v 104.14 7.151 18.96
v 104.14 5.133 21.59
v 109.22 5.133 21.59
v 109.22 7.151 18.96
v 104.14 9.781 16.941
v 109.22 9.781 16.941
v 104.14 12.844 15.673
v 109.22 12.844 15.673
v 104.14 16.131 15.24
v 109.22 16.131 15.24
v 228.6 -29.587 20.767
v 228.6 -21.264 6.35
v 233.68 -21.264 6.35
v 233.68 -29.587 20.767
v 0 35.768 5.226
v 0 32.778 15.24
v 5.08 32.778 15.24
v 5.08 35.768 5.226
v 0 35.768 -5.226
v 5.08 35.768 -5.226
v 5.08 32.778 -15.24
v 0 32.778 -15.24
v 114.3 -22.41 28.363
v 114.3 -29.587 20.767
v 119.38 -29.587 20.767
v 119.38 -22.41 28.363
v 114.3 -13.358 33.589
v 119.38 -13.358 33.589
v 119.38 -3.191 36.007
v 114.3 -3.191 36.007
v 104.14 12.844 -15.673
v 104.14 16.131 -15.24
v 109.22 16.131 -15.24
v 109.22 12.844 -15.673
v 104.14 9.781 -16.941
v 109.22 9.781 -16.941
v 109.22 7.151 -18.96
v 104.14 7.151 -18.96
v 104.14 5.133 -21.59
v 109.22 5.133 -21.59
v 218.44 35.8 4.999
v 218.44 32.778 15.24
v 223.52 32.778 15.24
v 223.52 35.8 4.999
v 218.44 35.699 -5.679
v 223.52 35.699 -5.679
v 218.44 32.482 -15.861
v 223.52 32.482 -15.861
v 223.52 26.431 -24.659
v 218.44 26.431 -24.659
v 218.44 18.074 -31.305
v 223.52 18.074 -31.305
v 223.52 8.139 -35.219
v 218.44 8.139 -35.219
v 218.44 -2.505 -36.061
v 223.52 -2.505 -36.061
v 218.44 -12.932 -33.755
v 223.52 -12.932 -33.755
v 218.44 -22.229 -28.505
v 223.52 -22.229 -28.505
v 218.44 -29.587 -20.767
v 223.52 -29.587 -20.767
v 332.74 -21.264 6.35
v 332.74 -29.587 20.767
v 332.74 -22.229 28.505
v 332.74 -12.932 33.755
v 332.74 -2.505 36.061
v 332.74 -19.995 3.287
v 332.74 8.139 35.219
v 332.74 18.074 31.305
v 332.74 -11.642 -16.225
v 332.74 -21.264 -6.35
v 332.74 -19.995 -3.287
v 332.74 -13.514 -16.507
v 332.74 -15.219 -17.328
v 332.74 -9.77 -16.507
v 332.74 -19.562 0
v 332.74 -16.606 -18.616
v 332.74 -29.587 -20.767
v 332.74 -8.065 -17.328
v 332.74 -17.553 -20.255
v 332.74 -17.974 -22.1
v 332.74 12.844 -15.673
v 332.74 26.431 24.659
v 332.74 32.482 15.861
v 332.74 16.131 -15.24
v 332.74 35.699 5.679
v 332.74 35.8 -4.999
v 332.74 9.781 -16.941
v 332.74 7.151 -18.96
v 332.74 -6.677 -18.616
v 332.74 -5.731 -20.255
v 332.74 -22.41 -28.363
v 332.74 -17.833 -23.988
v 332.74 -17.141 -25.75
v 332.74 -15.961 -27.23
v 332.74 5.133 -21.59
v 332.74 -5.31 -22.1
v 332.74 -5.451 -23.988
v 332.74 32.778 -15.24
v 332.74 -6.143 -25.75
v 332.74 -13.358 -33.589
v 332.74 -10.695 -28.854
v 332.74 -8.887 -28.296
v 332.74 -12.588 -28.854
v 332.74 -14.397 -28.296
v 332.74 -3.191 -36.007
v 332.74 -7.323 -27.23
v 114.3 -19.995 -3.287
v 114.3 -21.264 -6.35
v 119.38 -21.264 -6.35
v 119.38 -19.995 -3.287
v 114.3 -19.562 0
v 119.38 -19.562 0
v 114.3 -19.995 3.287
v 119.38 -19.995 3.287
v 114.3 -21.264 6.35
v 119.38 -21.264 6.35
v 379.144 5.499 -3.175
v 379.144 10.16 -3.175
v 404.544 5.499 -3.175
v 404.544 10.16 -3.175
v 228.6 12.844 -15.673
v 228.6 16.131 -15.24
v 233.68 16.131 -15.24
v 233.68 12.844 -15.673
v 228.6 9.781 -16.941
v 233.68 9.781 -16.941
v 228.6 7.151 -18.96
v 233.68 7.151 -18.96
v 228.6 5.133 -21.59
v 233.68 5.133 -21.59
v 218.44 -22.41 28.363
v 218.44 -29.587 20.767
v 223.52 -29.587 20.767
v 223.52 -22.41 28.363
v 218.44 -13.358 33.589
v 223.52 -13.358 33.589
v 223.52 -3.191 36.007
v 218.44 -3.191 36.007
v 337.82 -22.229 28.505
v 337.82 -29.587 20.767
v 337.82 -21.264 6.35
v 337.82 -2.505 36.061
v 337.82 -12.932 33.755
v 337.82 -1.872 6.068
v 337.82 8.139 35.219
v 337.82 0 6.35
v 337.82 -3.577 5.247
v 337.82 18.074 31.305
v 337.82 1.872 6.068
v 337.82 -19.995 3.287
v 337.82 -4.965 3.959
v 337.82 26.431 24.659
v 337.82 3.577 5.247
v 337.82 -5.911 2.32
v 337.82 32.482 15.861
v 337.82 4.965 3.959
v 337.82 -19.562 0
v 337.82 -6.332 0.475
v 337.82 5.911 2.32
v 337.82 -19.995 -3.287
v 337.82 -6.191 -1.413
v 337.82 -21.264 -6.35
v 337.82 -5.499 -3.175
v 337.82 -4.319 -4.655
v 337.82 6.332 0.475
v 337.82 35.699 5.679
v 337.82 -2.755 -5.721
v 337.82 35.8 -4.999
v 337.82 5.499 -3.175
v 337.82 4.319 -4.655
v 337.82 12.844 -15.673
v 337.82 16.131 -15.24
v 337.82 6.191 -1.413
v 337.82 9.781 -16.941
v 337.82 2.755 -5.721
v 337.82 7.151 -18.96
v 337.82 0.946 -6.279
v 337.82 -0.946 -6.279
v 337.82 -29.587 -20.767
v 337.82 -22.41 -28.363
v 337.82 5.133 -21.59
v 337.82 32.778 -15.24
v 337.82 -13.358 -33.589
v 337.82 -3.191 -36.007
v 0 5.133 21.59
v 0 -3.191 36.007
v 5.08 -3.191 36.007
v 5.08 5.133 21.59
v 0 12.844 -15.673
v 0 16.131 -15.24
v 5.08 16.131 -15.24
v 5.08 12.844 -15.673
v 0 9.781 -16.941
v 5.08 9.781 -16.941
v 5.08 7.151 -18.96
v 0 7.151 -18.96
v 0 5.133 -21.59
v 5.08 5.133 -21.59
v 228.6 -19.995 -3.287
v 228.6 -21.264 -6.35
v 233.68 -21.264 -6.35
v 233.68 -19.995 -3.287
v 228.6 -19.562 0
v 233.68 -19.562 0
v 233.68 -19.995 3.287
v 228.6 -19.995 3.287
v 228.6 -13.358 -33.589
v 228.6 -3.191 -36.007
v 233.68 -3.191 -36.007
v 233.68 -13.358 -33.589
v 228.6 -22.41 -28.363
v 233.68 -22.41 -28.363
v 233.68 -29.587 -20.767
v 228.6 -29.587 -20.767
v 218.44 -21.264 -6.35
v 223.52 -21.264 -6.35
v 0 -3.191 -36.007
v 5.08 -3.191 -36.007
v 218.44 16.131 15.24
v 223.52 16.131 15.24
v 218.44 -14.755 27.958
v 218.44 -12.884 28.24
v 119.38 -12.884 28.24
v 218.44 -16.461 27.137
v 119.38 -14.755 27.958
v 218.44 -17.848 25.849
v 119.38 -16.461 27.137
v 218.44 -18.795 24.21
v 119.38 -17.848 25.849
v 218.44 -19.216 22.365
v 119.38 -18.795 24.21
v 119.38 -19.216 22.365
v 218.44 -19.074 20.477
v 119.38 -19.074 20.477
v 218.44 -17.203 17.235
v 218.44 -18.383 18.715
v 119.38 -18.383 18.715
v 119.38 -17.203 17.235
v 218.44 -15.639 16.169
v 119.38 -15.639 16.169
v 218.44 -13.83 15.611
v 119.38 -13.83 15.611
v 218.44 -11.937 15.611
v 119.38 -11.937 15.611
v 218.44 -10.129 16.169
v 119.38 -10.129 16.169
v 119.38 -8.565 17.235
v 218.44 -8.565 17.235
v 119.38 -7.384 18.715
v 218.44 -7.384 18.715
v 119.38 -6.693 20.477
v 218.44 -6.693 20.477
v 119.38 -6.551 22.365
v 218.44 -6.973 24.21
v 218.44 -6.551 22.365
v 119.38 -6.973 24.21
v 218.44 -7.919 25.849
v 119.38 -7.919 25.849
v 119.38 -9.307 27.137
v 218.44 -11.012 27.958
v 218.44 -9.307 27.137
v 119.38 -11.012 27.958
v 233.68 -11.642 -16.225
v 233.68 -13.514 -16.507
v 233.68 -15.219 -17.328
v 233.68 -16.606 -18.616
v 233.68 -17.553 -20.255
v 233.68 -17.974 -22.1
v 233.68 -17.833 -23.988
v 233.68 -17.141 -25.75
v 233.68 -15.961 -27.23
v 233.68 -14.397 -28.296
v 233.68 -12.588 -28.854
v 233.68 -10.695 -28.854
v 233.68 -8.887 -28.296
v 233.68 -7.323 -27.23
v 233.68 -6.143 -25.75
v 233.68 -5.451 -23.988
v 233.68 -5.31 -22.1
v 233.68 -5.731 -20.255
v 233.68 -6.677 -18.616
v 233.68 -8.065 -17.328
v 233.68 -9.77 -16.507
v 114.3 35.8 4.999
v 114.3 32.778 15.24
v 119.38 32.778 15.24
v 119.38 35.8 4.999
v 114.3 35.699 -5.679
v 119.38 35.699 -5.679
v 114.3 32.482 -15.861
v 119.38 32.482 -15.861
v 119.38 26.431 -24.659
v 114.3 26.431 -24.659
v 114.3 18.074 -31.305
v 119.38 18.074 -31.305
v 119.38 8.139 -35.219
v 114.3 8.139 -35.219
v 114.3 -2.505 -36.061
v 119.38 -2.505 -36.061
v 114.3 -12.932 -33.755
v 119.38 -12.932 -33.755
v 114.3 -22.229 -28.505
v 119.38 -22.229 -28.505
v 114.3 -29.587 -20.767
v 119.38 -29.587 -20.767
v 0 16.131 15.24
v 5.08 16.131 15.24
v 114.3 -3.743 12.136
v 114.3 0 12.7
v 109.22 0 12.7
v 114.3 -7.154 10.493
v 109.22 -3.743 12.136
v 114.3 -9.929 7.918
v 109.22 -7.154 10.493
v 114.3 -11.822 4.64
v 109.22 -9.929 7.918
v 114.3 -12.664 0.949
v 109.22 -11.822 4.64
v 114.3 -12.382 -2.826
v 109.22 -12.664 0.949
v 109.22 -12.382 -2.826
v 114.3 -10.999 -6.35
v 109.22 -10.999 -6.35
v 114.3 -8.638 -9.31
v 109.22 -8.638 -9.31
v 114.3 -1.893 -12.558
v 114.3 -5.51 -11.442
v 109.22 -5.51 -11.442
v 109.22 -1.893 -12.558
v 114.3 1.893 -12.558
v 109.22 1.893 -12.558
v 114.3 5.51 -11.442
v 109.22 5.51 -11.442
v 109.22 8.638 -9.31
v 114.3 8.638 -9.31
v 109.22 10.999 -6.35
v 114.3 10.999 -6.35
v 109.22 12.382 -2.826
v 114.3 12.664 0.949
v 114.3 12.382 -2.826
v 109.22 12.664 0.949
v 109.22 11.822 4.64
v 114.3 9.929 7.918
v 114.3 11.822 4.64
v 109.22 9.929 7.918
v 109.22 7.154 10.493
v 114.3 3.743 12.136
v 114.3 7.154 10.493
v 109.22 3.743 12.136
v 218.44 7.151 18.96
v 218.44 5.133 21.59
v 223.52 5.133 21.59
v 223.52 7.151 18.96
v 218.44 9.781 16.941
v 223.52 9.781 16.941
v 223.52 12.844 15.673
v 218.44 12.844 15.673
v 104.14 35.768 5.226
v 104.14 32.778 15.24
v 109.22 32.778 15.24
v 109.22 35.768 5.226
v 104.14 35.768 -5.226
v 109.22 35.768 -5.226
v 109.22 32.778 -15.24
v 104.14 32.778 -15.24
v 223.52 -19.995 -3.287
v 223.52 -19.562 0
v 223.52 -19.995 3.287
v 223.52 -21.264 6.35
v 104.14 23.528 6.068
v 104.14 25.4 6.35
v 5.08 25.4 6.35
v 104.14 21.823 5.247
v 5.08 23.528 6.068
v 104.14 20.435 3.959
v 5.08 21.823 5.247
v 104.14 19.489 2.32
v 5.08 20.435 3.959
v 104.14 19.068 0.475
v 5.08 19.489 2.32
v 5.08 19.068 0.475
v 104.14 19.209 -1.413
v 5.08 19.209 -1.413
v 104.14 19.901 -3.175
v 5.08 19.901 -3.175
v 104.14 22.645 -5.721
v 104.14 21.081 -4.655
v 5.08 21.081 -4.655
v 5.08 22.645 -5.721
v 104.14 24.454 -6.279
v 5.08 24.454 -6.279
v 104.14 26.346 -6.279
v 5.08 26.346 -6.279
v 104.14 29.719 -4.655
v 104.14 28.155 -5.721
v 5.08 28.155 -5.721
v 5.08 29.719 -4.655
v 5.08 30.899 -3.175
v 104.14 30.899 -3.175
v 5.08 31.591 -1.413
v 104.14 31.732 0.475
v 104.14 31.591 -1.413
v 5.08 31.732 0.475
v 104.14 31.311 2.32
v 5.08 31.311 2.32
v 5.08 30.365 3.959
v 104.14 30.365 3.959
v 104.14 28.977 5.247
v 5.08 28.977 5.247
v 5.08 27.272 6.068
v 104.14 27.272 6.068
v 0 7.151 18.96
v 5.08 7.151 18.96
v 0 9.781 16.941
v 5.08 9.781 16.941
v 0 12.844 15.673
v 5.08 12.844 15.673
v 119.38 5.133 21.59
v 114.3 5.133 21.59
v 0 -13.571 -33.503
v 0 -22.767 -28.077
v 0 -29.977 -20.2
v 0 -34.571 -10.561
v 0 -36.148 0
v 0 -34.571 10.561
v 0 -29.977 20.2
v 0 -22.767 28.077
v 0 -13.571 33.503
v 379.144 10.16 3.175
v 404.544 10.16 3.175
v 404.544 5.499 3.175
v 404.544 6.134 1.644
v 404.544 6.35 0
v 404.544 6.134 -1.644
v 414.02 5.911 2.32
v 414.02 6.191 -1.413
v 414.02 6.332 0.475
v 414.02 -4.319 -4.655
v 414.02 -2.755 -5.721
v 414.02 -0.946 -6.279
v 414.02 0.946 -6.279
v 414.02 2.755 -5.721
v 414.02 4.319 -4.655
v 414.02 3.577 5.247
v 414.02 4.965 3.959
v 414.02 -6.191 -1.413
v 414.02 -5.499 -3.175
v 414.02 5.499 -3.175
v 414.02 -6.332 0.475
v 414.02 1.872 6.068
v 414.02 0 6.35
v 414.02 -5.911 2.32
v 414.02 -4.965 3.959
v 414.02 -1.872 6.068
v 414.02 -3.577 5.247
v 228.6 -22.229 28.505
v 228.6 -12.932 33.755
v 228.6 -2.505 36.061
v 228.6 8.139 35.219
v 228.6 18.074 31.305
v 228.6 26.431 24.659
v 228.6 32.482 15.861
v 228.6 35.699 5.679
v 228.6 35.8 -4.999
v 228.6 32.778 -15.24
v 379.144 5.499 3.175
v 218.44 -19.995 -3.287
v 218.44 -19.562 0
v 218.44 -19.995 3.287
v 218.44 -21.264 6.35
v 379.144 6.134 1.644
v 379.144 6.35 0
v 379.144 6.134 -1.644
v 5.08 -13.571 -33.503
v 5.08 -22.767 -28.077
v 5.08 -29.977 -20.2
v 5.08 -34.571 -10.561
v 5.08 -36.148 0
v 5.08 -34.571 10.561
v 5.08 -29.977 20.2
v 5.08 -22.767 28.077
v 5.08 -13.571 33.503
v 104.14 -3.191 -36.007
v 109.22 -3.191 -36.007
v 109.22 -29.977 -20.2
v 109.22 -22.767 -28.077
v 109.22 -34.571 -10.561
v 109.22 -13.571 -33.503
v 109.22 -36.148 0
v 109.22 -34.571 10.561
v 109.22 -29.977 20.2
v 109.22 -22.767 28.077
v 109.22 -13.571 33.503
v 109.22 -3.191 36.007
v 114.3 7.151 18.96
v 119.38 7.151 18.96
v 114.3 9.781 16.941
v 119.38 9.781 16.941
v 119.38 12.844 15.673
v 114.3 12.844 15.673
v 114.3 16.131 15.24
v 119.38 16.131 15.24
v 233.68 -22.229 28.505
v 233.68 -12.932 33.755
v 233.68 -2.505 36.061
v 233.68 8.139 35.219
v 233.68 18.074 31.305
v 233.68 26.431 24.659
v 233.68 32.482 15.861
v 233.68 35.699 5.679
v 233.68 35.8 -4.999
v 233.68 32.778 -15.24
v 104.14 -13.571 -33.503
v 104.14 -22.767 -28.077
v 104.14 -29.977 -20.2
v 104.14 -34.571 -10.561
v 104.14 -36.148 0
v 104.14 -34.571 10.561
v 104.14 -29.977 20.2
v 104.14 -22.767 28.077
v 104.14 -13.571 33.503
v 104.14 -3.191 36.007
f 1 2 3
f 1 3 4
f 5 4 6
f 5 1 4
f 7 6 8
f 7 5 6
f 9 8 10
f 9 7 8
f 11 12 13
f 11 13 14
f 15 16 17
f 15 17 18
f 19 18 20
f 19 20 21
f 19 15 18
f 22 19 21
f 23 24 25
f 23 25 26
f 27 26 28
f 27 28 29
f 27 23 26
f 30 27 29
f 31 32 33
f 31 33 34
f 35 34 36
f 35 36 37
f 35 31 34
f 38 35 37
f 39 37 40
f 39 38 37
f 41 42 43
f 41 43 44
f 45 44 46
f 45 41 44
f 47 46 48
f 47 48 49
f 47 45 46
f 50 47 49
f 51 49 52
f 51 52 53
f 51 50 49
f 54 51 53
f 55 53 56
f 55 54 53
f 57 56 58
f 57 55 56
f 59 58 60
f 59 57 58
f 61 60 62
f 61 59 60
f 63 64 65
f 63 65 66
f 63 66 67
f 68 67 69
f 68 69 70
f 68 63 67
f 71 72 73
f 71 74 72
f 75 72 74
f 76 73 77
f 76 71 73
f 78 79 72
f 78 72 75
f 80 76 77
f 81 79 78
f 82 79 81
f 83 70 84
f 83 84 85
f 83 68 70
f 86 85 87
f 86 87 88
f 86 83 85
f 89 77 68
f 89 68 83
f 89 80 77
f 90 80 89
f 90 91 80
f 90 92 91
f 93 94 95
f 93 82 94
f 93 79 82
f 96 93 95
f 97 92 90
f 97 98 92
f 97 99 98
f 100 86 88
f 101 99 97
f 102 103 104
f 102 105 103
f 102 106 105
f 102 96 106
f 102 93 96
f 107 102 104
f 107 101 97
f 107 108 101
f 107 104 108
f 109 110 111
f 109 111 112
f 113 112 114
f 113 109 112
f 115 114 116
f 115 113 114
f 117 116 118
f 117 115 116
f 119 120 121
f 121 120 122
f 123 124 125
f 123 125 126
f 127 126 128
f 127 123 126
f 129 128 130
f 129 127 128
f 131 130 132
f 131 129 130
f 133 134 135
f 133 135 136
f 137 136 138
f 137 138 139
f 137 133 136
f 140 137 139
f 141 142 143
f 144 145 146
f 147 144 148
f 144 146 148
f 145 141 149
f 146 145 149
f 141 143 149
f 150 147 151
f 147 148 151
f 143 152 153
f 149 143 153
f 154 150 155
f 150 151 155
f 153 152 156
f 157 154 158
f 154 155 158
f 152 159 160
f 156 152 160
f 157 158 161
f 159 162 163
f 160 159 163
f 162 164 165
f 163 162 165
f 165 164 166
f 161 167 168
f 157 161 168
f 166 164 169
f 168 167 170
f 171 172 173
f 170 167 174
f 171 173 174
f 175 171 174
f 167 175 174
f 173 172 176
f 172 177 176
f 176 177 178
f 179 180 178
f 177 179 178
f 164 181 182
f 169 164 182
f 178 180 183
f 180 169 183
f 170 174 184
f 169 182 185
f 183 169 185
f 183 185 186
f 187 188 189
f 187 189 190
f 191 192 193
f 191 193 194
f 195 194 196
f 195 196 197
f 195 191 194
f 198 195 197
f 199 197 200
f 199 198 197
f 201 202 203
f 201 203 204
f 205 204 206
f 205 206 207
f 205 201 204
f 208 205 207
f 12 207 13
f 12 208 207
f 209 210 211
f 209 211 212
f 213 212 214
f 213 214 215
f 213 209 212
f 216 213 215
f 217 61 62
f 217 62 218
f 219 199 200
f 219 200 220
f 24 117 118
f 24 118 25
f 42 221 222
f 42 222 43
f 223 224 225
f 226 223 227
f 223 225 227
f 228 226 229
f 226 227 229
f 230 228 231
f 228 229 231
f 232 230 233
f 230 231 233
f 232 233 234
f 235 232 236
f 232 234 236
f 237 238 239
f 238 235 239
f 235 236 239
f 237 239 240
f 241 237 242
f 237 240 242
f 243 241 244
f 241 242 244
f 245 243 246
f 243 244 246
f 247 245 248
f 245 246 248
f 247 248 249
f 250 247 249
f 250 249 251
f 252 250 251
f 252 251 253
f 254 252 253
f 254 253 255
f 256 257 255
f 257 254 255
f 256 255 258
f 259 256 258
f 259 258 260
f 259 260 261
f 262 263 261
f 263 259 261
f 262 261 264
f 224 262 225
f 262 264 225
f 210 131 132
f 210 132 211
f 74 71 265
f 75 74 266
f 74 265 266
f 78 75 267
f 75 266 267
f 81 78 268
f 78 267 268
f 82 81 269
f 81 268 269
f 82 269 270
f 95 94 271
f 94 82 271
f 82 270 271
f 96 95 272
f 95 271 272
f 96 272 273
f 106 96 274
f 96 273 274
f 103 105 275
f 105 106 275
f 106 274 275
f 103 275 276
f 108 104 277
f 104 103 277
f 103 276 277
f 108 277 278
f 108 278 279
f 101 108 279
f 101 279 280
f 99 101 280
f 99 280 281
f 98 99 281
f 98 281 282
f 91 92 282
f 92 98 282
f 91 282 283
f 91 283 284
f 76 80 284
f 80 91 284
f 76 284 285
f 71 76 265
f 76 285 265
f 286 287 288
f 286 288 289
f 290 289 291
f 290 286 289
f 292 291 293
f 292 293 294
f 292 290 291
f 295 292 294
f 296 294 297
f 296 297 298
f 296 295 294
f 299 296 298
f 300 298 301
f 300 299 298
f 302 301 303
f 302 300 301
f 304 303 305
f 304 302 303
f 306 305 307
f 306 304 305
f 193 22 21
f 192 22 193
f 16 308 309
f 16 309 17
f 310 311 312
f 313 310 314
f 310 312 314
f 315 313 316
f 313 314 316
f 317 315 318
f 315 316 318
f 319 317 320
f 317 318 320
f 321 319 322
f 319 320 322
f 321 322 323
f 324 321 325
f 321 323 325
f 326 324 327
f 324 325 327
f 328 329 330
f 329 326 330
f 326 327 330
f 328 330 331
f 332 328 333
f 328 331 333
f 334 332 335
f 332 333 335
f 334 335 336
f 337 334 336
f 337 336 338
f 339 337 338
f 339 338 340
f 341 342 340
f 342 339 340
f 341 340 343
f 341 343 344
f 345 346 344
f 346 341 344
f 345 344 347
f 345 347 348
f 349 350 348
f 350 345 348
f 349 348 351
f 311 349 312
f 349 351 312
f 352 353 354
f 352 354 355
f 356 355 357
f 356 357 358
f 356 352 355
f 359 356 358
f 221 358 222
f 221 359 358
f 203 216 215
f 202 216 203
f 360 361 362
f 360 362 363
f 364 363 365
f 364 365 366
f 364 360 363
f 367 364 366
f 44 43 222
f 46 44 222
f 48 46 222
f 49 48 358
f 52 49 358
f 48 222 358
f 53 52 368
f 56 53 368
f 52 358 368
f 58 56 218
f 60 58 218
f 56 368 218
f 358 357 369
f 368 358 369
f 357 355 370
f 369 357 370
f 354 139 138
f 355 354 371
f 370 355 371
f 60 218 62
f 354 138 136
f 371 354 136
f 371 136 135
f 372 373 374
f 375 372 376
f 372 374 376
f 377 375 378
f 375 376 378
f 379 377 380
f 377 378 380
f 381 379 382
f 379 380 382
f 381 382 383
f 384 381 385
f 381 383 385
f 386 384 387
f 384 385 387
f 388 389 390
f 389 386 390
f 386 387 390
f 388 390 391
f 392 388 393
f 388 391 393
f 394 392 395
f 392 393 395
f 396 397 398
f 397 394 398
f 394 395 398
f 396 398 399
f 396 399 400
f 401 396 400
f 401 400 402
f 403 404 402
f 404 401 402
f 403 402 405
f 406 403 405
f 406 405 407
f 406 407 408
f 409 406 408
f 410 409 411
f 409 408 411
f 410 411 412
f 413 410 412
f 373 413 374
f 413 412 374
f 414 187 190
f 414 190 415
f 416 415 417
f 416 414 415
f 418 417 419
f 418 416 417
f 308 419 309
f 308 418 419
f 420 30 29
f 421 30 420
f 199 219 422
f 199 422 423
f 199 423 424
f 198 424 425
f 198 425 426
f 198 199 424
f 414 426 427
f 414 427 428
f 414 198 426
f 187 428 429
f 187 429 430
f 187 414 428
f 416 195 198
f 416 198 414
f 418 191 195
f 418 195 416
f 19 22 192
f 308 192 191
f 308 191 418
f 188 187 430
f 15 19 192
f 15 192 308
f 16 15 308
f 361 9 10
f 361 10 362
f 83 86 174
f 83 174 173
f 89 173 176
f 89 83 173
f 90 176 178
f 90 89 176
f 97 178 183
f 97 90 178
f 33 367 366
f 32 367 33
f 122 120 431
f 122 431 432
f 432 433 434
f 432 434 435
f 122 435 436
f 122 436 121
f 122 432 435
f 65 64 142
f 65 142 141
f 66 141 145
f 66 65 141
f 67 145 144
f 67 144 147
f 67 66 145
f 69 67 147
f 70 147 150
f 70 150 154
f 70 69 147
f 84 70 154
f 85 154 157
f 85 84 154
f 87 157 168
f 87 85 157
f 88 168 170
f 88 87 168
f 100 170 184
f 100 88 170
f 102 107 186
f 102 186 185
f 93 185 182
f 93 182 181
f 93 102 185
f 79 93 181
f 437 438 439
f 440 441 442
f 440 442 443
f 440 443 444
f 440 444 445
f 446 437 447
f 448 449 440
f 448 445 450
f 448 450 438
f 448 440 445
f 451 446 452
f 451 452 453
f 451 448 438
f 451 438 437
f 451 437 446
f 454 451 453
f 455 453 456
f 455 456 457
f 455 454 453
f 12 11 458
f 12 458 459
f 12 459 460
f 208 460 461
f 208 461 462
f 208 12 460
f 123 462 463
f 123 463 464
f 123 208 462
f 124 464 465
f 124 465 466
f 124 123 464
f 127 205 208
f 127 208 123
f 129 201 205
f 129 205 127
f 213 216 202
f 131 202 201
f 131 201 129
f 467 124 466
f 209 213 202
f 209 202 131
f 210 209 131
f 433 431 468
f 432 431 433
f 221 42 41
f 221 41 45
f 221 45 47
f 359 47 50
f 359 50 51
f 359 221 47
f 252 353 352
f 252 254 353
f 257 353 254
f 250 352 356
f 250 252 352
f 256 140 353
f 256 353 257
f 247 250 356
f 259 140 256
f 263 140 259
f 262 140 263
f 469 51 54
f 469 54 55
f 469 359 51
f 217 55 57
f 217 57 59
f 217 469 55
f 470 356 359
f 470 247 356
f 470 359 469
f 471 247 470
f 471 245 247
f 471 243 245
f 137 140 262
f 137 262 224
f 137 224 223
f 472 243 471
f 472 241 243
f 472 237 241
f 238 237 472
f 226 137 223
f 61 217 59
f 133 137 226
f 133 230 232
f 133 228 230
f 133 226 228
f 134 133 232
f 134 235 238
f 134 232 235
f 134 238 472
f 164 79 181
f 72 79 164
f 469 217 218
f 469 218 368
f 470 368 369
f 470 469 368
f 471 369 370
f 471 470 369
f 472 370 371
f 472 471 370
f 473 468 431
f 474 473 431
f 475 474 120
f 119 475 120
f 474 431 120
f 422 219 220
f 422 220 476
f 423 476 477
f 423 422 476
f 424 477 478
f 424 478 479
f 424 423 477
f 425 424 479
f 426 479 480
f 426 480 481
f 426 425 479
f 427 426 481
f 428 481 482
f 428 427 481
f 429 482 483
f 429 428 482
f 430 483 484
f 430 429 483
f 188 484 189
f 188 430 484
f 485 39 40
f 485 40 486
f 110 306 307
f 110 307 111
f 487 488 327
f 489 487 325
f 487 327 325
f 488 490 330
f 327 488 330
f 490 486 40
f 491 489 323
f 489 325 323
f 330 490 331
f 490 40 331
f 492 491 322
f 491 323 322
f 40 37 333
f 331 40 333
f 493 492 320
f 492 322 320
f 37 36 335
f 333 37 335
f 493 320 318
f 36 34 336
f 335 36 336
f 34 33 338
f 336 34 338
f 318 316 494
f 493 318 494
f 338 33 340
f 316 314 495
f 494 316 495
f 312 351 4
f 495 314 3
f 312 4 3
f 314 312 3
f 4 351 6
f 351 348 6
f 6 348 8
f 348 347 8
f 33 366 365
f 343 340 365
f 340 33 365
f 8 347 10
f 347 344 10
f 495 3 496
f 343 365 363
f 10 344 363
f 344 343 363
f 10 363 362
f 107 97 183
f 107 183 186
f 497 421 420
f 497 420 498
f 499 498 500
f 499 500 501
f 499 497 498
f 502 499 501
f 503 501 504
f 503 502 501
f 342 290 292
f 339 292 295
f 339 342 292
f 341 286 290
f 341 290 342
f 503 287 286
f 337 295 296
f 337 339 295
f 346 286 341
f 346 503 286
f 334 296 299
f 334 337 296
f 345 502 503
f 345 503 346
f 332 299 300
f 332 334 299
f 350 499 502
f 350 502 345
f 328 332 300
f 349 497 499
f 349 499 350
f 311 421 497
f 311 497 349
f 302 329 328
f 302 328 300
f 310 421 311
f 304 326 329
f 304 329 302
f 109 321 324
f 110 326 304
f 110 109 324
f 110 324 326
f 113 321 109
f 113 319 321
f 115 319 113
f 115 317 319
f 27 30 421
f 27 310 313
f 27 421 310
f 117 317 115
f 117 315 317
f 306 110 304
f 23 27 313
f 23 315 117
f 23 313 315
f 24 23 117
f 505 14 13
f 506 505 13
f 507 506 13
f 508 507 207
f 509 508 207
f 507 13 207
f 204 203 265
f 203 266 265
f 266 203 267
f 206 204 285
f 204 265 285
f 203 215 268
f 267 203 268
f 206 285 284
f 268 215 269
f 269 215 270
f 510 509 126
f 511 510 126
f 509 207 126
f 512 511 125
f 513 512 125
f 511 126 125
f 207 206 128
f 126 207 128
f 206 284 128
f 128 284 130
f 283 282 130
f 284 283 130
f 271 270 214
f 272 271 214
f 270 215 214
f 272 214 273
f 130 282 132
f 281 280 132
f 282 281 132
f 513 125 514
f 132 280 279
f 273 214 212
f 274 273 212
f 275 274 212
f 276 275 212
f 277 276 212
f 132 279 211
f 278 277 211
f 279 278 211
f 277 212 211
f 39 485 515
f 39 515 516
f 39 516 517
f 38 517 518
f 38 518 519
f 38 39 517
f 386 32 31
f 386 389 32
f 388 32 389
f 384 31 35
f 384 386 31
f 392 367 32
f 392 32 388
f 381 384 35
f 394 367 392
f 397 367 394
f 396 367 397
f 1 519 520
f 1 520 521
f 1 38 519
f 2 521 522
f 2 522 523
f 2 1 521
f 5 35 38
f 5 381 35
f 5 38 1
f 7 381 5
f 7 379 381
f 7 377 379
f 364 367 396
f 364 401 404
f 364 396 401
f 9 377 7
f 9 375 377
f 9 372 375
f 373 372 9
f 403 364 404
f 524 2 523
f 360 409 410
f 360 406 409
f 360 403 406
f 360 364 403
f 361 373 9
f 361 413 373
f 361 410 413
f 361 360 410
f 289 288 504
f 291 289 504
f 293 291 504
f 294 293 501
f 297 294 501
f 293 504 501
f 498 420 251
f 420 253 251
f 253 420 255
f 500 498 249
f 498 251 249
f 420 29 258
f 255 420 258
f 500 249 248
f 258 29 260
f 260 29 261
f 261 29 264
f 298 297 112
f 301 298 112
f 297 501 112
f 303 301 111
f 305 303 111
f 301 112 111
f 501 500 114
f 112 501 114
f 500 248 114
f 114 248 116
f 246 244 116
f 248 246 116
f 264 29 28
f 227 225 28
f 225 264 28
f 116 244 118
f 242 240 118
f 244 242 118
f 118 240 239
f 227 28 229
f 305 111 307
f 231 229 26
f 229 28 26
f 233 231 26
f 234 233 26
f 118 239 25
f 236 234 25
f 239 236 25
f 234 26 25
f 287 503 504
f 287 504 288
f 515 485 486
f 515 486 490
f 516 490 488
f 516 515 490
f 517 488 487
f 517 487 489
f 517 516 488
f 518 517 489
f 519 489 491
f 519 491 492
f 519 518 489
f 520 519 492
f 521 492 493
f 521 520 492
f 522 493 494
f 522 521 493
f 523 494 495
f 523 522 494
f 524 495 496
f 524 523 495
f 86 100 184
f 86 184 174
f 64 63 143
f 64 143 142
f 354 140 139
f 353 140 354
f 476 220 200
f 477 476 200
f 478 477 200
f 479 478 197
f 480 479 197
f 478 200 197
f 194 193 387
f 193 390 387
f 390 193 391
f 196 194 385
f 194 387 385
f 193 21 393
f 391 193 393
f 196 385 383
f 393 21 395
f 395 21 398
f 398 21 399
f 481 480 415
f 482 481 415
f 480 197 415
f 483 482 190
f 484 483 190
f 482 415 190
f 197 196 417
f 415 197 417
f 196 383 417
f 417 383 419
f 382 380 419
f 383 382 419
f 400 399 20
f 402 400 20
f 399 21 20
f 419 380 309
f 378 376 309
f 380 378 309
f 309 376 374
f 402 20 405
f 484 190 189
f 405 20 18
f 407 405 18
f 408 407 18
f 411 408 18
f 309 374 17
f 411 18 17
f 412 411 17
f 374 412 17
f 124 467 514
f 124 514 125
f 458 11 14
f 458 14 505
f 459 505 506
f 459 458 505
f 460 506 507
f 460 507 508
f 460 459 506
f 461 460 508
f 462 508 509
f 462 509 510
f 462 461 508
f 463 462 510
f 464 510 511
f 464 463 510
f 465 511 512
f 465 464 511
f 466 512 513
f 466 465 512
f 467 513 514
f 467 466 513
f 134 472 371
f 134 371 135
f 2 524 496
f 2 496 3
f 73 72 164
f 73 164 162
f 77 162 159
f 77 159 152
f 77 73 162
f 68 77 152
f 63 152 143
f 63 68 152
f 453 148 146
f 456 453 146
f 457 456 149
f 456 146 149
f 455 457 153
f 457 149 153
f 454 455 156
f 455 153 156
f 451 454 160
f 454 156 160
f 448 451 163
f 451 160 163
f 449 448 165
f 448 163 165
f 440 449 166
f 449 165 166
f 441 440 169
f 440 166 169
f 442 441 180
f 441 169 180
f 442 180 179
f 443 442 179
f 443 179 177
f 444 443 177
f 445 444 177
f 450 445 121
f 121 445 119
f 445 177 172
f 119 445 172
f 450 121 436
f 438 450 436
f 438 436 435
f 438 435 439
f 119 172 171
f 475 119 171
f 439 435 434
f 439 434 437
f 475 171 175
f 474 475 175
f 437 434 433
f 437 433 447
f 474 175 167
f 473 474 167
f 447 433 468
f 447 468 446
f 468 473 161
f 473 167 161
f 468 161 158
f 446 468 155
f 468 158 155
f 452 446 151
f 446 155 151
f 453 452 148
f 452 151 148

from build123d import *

# Parameters (mm, degrees)
BOSS_EXTRUDE2_DEPTH      = 5.08
BODY_MOVE_COPY13_ANGLE   = 120
BODY_MOVE_COPY18_ANGLE   = 120
BOSS_EXTRUDE3_REACH      = 338.644
SKETCH8_R                = 6.35
BOSS_EXTRUDE4_REACH      = 236.246
SKETCH9_R                = 12.7
BOSS_EXTRUDE5_REACH      = 226.342
SKETCH11_R               = 6.35
BOSS_EXTRUDE6_REACH      = 241.206
SKETCH13_R               = 6.35
SKETCH14_R               = 6.35
BOSS_EXTRUDE7_DEPTH      = 76.2
BOSS_EXTRUDE8_REACH      = 420.167
BOSS_EXTRUDE8_END_RADIUS = 6.35
SKETCH15_W               = 25.4
SKETCH15_H               = 6.35


with BuildPart() as part:
    # Sketch5 → Boss-Extrude2 (new body)
    with BuildSketch(Plane(origin=(0, 0, 0), x_dir=(0, 0, -1), z_dir=(1, 0, 0))):
        with BuildLine():
            Line((15.24, 32.778024856), (15.24, 16.131166521))
            ThreePointArc((15.24, 16.131166521), (16.941477372, 9.781166521), (21.59, 5.132643893))
            Line((21.59, 5.132643893), (36.006602211, -3.190785274))
            ThreePointArc((36.006602211, -3.190785274), (0, -36.147704125), (-36.006602211, -3.190785274))
            Line((-36.006602211, -3.190785274), (-21.59, 5.132643893))
            ThreePointArc((-21.59, 5.132643893), (-16.941477372, 9.781166521), (-15.24, 16.131166521))
            Line((-15.24, 16.131166521), (-15.24, 32.778024856))
            ThreePointArc((-15.24, 32.778024856), (0, 36.147704125), (15.24, 32.778024856))
        make_face()
    extrude(amount=BOSS_EXTRUDE2_DEPTH)


with BuildPart() as body_2:
    # Body-Move/Copy11: copy of part
    add(part.part.moved(Location((104.14, 0, 0))))


with BuildPart() as body_3:
    # Body-Move/Copy12: copy of body 2
    add(body_2.part.moved(Location((10.16, 0, 0))))


with BuildPart() as body_3_1:
    # Body-Move/Copy13: moved
    add(body_3.part.rotate(Axis((0, 0, 0), (1, 0, 0)), BODY_MOVE_COPY13_ANGLE))


with BuildPart() as body_4:
    # Body-Move/Copy14: copy of body 3
    add(body_3_1.part.moved(Location((104.14, 0, 0))))


with BuildPart() as body_5:
    # Body-Move/Copy16: copy of body 4
    add(body_4.part.moved(Location((10.16, 0, 0))))


with BuildPart() as body_5_1:
    # Body-Move/Copy18: moved
    add(body_5.part.rotate(Axis((0, 0, 0), (1, 0, 0)), BODY_MOVE_COPY18_ANGLE))


with BuildPart() as body_6:
    # Body-Move/Copy19: copy of body 5
    add(body_5_1.part.moved(Location((104.14, 0, 0))))

    # Sketch13 → Boss-Extrude6 (add, up to next)
    with BuildSketch(Plane(origin=(233.68, 0, 0), x_dir=(0, 0, -1), z_dir=(1, 0, 0)), mode=Mode.PRIVATE) as boss_extrude6_sk1:
        with Locations(Location((22.574940501, -11.6418238, 0), (0, 0, 180))):
            Circle(SKETCH13_R)
    boss_extrude6_tool1 = extrude(boss_extrude6_sk1.sketch, amount=BOSS_EXTRUDE6_REACH, mode=Mode.PRIVATE) - body_6.part

    add(body_5_1.part)  # Boss-Extrude6 merges body 5
    add(boss_extrude6_tool1.solids().sort_by_distance((233.68, -11.641824, -22.574941))[0])

    # Sketch14 → Boss-Extrude7 (add)
    with BuildSketch(Plane(origin=(337.82, 0, 0), x_dir=(0, 0, -1), z_dir=(1, 0, 0))):
        with Locations(Location((0, 0, 0), (0, 0, 180))):
            Circle(SKETCH14_R)
    extrude(amount=BOSS_EXTRUDE7_DEPTH)

    # Boss-Extrude8: up to this cylinder (the profile starts outside it)
    boss_extrude8_end = Plane(origin=(391.843814, 0, 0), z_dir=(-1, 0, 0)) * Cylinder(BOSS_EXTRUDE8_END_RADIUS, 854.034, mode=Mode.PRIVATE)
    # Sketch15 → Boss-Extrude8 (add, up to the surface)
    with BuildSketch(Plane(origin=(0, 10.16, 0), x_dir=(1, 0, 0), z_dir=(0, 1, 0)), mode=Mode.PRIVATE) as boss_extrude8_sk1:
        with Locations((391.843813574, 0)):
            Rectangle(SKETCH15_W, SKETCH15_H)
    boss_extrude8_tool1 = extrude(boss_extrude8_sk1.sketch, amount=-BOSS_EXTRUDE8_REACH, mode=Mode.PRIVATE) - boss_extrude8_end
    add(boss_extrude8_tool1.solids().sort_by_distance((391.843814, 10.16, 0))[0])


with BuildPart() as body_2_1:
    add(body_2.part)

    # Sketch8 → Boss-Extrude3 (add, up to next)
    with BuildSketch(Plane(origin=(5.08, 0, 0), x_dir=(0, 0, -1), z_dir=(1, 0, 0)), mode=Mode.PRIVATE) as boss_extrude3_sk1:
        with Locations(Location((0, 25.4, 0), (0, 0, 180))):
            Circle(SKETCH8_R)
    boss_extrude3_tool1 = extrude(boss_extrude3_sk1.sketch, amount=BOSS_EXTRUDE3_REACH, mode=Mode.PRIVATE) - body_2_1.part

    add(part.part)  # Boss-Extrude3 merges part
    add(boss_extrude3_tool1.solids().sort_by_distance((5.08, 25.4, 0))[0])


with BuildPart() as body_3_2:
    add(body_3_1.part)

    # Sketch9 → Boss-Extrude4 (add, up to next)
    with BuildSketch(Plane(origin=(109.22, 0, 0), x_dir=(0, 0, -1), z_dir=(1, 0, 0)), mode=Mode.PRIVATE) as boss_extrude4_sk1:
        with Locations(Location((0, 0, 0), (0, 0, 180))):
            Circle(SKETCH9_R)
    boss_extrude4_tool1 = extrude(boss_extrude4_sk1.sketch, amount=BOSS_EXTRUDE4_REACH, mode=Mode.PRIVATE) - body_3_2.part

    add(body_2_1.part)  # Boss-Extrude4 merges body 2
    add(boss_extrude4_tool1.solids().sort_by_distance((109.22, 0, 0))[0])


with BuildPart() as body_4_1:
    add(body_4.part)

    # Sketch11 → Boss-Extrude5 (add, up to next)
    with BuildSketch(Plane(origin=(119.38, 0, 0), x_dir=(0, 0, -1), z_dir=(1, 0, 0)), mode=Mode.PRIVATE) as boss_extrude5_sk1:
        with Locations(Location((-21.889975743, -12.883670361, 0), (0, 0, 180))):
            Circle(SKETCH11_R)
    boss_extrude5_tool1 = extrude(boss_extrude5_sk1.sketch, amount=BOSS_EXTRUDE5_REACH, mode=Mode.PRIVATE) - body_4_1.part

    add(body_3_2.part)  # Boss-Extrude5 merges body 3
    add(boss_extrude5_tool1.solids().sort_by_distance((119.38, -12.88367, 21.889976))[0])


solid = Compound([body_6.part, body_4_1.part])
